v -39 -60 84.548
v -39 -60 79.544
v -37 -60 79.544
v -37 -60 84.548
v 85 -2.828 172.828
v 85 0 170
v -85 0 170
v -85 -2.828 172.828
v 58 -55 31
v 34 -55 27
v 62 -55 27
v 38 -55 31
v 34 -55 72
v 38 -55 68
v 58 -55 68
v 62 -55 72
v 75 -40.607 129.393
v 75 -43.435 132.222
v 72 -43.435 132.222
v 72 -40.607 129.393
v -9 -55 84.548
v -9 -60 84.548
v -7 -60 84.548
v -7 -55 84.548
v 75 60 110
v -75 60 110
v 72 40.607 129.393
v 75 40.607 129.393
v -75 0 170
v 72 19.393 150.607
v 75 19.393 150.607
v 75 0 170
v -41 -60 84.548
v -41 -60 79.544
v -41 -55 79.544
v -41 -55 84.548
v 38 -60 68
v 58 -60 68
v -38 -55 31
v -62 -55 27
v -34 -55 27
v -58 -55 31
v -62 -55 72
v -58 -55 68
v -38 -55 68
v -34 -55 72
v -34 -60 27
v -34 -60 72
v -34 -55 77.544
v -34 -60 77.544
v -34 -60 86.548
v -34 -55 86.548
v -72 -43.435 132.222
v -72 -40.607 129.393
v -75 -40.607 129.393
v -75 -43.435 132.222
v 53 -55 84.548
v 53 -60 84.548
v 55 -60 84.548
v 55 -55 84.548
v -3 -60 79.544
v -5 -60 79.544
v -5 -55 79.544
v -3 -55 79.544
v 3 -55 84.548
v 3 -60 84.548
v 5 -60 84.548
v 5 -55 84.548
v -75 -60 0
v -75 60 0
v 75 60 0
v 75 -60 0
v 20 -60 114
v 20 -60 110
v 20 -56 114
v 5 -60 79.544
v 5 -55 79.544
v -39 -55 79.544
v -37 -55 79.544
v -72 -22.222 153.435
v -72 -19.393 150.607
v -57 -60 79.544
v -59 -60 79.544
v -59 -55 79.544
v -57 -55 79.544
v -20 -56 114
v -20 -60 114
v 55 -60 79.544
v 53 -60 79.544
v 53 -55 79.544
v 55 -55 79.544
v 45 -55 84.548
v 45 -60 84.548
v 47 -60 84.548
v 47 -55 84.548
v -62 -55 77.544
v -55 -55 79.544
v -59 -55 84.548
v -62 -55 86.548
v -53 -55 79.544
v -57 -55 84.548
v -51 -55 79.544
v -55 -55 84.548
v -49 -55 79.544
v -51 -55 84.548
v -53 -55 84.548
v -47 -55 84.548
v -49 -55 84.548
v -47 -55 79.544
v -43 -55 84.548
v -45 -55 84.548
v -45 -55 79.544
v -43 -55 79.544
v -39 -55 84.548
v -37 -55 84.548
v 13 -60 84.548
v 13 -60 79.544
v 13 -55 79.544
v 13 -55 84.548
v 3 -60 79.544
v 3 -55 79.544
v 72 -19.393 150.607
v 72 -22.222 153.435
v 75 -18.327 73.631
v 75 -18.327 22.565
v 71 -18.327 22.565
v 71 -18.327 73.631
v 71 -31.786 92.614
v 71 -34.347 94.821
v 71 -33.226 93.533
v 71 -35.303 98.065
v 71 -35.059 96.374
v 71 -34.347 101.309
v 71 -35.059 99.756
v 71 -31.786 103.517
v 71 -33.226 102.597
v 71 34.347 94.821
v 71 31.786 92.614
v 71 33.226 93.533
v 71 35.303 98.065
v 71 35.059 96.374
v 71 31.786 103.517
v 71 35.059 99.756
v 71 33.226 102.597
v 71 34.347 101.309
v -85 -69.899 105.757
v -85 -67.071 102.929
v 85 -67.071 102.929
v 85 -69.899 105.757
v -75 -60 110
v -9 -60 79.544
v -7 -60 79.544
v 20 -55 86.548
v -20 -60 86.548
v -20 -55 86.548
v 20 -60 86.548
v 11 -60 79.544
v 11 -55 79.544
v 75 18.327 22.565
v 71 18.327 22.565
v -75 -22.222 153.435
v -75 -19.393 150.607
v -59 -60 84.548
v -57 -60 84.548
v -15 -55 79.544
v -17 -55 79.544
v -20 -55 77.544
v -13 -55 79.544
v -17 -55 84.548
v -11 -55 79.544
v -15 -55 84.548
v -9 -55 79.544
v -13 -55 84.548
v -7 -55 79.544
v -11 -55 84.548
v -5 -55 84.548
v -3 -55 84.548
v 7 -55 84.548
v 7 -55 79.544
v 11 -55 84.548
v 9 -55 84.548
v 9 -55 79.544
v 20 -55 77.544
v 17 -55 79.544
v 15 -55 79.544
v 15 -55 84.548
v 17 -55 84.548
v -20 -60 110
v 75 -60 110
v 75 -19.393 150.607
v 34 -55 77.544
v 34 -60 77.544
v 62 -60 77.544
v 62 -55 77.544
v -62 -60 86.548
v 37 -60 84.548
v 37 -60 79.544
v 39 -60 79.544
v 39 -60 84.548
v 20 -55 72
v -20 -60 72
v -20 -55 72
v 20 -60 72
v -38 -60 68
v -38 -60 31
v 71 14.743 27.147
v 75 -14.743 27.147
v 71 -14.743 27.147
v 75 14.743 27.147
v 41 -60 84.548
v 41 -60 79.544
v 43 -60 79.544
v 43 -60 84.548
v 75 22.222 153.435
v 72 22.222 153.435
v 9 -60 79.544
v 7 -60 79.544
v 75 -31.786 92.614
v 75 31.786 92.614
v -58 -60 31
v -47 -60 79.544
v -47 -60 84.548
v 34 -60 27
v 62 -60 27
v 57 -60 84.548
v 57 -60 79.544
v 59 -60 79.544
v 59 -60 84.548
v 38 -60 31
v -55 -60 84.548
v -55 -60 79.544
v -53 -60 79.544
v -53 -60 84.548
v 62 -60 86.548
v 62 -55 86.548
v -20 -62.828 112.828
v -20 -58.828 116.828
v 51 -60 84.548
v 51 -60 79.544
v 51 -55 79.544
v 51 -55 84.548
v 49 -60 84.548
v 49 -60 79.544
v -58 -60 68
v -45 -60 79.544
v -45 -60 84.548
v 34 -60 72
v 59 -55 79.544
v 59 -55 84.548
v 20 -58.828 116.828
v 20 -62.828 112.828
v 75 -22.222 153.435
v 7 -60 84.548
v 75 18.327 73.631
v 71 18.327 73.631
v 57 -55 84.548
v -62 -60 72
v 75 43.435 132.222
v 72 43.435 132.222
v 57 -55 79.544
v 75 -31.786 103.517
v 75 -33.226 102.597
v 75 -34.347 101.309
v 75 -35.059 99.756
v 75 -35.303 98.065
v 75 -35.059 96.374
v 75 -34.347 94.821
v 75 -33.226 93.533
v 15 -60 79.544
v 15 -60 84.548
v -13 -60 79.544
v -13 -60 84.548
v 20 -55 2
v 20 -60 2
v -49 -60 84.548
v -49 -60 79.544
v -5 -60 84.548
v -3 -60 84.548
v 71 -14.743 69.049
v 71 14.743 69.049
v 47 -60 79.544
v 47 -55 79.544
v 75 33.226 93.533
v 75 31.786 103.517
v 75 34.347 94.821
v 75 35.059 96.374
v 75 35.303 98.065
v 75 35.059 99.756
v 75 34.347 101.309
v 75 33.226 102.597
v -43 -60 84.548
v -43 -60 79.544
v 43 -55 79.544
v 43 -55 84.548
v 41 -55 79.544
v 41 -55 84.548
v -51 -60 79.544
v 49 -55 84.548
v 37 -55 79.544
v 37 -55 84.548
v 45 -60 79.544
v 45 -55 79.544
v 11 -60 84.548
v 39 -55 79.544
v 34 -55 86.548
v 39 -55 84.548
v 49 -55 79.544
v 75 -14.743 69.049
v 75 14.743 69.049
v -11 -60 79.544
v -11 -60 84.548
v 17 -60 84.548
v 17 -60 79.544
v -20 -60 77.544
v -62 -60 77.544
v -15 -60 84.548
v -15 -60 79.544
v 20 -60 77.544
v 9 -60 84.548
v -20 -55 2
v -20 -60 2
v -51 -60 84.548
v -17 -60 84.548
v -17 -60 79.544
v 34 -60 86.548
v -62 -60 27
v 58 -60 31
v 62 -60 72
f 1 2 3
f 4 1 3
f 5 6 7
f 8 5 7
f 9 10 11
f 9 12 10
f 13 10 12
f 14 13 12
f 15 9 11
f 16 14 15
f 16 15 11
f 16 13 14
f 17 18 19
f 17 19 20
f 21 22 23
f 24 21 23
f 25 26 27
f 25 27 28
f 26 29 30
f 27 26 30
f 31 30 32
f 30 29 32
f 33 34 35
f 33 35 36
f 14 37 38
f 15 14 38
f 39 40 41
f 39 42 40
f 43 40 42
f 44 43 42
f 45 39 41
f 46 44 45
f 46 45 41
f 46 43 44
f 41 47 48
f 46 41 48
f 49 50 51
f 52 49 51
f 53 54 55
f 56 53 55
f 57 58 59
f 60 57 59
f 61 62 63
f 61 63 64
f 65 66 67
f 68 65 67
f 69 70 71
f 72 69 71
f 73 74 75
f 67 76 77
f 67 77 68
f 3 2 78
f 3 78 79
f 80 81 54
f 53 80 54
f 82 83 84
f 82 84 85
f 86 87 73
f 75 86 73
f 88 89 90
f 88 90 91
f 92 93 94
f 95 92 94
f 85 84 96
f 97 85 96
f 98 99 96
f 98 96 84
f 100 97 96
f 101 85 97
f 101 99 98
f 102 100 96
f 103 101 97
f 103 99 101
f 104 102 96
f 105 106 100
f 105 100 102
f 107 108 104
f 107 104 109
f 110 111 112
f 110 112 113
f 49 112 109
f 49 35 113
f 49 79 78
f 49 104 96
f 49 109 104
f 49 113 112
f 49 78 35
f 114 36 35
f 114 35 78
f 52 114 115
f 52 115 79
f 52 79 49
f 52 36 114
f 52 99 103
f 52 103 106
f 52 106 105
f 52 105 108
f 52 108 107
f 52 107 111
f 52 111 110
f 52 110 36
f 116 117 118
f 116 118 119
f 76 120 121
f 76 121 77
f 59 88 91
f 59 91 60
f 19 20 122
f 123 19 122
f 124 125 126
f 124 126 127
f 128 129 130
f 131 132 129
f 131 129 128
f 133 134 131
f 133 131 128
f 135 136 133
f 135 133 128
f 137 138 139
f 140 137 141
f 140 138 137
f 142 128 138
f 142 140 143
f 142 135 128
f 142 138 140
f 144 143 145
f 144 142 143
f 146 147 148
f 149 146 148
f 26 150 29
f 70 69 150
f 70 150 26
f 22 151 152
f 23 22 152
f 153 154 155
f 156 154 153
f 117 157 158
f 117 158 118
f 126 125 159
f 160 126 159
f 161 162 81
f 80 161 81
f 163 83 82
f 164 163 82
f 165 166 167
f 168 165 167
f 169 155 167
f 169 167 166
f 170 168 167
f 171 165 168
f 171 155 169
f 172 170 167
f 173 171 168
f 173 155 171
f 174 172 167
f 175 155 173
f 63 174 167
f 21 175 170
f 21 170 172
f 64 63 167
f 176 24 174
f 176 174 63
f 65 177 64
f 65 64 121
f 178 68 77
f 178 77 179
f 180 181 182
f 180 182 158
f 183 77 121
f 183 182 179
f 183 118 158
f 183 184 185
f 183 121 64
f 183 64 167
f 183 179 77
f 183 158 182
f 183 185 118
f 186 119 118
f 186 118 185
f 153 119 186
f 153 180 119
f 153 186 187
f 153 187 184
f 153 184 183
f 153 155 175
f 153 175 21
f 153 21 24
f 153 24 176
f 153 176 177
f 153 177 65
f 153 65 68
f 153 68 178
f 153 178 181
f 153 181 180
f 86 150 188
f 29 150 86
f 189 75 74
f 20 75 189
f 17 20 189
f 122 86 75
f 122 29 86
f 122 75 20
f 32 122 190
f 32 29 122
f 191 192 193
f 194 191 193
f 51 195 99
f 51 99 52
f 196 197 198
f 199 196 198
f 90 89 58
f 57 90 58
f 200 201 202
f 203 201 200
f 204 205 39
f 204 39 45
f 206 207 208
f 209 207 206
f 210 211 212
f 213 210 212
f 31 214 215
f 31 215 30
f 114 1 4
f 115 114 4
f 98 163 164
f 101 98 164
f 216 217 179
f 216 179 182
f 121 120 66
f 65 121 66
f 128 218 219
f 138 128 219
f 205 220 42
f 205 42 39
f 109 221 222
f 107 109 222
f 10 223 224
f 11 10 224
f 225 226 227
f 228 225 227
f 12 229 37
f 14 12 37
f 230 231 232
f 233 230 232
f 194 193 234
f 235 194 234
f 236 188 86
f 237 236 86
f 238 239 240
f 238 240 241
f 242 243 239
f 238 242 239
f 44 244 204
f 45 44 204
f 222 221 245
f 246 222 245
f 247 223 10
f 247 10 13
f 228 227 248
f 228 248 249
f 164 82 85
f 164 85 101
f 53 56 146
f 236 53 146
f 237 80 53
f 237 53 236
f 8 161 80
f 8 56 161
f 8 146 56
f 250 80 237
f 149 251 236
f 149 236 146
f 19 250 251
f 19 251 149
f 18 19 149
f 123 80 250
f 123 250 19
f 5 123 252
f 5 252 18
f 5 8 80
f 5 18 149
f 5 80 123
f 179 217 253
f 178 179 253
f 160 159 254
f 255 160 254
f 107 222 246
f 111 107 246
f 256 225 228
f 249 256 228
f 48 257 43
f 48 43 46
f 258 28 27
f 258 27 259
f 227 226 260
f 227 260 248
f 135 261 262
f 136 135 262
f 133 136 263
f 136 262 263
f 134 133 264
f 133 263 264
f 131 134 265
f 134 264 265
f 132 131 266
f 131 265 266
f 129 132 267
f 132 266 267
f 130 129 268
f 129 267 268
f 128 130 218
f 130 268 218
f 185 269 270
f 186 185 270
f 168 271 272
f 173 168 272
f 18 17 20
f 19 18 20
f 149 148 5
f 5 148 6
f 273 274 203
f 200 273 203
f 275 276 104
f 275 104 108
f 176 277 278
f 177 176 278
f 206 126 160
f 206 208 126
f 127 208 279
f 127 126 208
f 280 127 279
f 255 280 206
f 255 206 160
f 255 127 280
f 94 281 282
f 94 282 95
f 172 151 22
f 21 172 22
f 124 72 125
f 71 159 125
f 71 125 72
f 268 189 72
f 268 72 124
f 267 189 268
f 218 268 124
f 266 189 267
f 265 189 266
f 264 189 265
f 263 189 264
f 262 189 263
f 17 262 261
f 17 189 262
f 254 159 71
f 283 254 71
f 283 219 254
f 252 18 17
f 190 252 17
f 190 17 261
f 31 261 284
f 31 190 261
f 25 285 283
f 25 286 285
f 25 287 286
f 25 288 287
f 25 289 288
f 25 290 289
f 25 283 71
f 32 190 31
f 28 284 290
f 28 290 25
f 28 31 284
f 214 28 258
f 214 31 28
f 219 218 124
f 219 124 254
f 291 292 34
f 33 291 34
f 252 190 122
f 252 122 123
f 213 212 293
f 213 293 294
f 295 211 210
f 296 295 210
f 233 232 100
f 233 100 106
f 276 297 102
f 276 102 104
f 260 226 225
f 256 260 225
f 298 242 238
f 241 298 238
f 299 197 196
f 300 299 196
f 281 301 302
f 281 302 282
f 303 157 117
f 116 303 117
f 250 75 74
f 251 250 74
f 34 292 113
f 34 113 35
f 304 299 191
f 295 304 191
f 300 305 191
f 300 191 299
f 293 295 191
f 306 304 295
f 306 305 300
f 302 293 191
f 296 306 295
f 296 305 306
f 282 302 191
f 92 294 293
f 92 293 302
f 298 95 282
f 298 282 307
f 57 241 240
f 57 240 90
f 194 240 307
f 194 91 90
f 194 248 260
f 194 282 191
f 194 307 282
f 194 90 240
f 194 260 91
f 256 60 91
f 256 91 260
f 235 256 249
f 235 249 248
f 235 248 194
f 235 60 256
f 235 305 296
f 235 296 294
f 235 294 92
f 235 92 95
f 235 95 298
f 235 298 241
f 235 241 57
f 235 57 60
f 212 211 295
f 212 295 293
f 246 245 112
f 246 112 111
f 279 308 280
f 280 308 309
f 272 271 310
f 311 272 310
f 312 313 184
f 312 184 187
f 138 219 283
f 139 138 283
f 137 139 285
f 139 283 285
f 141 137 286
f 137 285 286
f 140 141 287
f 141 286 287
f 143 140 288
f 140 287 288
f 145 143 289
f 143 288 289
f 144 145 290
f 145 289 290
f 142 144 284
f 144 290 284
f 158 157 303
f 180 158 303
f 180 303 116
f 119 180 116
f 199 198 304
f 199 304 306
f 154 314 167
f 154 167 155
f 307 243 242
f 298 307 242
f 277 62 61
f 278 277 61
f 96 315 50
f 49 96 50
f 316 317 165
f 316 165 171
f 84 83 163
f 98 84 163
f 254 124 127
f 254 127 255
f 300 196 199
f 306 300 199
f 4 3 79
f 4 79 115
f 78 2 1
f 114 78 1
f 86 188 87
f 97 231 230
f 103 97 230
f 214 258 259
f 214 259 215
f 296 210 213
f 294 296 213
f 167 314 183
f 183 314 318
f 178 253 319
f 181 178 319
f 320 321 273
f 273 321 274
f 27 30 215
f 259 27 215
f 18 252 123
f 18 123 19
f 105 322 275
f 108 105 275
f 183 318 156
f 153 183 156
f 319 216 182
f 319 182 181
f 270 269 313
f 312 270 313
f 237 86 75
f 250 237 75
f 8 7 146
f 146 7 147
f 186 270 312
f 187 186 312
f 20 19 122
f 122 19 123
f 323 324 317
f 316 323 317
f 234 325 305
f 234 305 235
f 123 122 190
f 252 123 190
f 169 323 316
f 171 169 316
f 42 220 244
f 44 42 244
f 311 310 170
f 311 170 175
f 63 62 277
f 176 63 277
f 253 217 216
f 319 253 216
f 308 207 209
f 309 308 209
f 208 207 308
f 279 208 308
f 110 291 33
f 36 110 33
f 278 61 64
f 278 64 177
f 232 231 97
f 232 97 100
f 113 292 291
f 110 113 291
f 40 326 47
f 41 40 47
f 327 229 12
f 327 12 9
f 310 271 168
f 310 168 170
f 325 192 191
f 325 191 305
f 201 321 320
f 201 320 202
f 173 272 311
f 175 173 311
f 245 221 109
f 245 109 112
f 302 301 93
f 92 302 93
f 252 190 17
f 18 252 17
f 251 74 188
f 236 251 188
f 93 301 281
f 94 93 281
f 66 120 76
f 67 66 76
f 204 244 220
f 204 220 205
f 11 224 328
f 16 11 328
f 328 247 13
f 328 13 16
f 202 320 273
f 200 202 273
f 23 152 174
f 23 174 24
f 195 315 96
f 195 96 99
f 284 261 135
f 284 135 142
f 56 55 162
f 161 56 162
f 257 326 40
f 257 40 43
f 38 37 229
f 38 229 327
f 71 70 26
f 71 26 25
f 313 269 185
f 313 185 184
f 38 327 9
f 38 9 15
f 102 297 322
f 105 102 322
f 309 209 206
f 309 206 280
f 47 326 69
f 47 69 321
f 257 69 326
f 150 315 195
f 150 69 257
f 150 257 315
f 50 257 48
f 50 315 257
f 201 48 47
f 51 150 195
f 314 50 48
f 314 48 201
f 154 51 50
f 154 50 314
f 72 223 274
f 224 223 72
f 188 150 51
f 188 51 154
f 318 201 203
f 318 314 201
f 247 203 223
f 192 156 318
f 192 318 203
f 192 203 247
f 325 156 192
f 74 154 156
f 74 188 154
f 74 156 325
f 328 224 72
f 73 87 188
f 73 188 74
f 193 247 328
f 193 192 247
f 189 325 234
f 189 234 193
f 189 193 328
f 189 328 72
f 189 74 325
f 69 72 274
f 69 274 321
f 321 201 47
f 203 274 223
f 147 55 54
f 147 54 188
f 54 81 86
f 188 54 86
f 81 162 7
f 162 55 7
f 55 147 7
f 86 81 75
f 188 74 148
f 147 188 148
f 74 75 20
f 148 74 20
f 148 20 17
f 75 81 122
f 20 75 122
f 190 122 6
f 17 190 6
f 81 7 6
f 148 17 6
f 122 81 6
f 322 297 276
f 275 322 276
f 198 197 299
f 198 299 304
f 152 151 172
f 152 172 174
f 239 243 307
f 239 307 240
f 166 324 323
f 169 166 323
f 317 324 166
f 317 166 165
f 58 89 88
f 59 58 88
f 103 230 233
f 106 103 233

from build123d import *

# Parameters (mm, degrees)
F0_W      = 150
F0_H      = 120
F1_DEPTH  = 170
F2_SIZE   = 59.99999
F3_W      = 28
F3_H      = 9.0039297938
F3_W_2    = 2
F3_H_2    = 5.0039297938
F3_H_3    = 45
F3_W_3    = 20
F3_H_4    = 37
F3_W_4    = 40
F3_H_5    = 70
F4_DEPTH  = 5
F3_H_6    = 3.99999
F5_DEPTH  = 4
F6_W      = 36.6545170546
F6_H      = 51.0658398271
F6_W_2    = 29.4850878417
F6_H_2    = 41.9020280242
F6_W_3    = 63.571639359
F6_H_3    = 10.9027773142
F7_DEPTH  = 4
F8_DEPTH  = 3
F10_DEPTH = 4


# Not quite as in the source:
# - a fillet or chamfer is up to 0.001 mm smaller than in the source, because OpenCascade refuses the exact size
# - ends of sketch curves that miss each other by under 0.0002 mm in the source are joined
# - a feature names something its author has since deleted; it is built from what else it names


with BuildPart() as f1:
    # F0 (on Top) → F1 (new body)
    with BuildSketch(Plane.XY):
        Rectangle(F0_W, F0_H)
    extrude(amount=F1_DEPTH)

    # F2 (size 60 in the source; OpenCascade refuses exactly that, so slightly less here)
    f2_edges = [f1.edges().sort_by_distance(p)[0] for p in [
        (0, -60, 170),
        (0, 60, 170),
    ]]
    chamfer(f2_edges, length=F2_SIZE)

    # F3 (on face) → F4 (cut)
    with BuildSketch(Plane.XZ.offset(60)):
        with Locations((-48, 82.0457972586)):
            Rectangle(F3_W, F3_H)
        with Locations((-58, 82.0457972586)):
            Rectangle(F3_W_2, F3_H_2, mode=Mode.SUBTRACT)
        with Locations((-54, 82.0457972586)):
            Rectangle(F3_W_2, F3_H_2, mode=Mode.SUBTRACT)
        with Locations((-50, 82.0457972586)):
            Rectangle(F3_W_2, F3_H_2, mode=Mode.SUBTRACT)
        with Locations((-46, 82.0457972586)):
            Rectangle(F3_W_2, F3_H_2, mode=Mode.SUBTRACT)
        with Locations((-42, 82.0457972586)):
            Rectangle(F3_W_2, F3_H_2, mode=Mode.SUBTRACT)
        with Locations((-38, 82.0457972586)):
            Rectangle(F3_W_2, F3_H_2, mode=Mode.SUBTRACT)
        with Locations((-48, 49.5)):
            Rectangle(F3_W, F3_H_3)
        with Locations((-48, 49.5)):
            Rectangle(F3_W_3, F3_H_4, mode=Mode.SUBTRACT)
        with Locations((0, 37)):
            Rectangle(F3_W_4, F3_H_5)
        with Locations((0, 82.0457972586)):
            Rectangle(F3_W_4, F3_H)
        with Locations((-16, 82.0457972586)):
            Rectangle(F3_W_2, F3_H_2, mode=Mode.SUBTRACT)
        with Locations((-12, 82.0457972586)):
            Rectangle(F3_W_2, F3_H_2, mode=Mode.SUBTRACT)
        with Locations((-8, 82.0457972586)):
            Rectangle(F3_W_2, F3_H_2, mode=Mode.SUBTRACT)
        with Locations((-4, 82.0457972586)):
            Rectangle(F3_W_2, F3_H_2, mode=Mode.SUBTRACT)
        with Locations((4, 82.0457972586)):
            Rectangle(F3_W_2, F3_H_2, mode=Mode.SUBTRACT)
        with Locations((8, 82.0457972586)):
            Rectangle(F3_W_2, F3_H_2, mode=Mode.SUBTRACT)
        with Locations((12, 82.0457972586)):
            Rectangle(F3_W_2, F3_H_2, mode=Mode.SUBTRACT)
        with Locations((16, 82.0457972586)):
            Rectangle(F3_W_2, F3_H_2, mode=Mode.SUBTRACT)
        with Locations((48, 82.0457972586)):
            Rectangle(F3_W, F3_H)
        with Locations((38, 82.0457972586)):
            Rectangle(F3_W_2, F3_H_2, mode=Mode.SUBTRACT)
        with Locations((42, 82.0457972586)):
            Rectangle(F3_W_2, F3_H_2, mode=Mode.SUBTRACT)
        with Locations((46, 82.0457972586)):
            Rectangle(F3_W_2, F3_H_2, mode=Mode.SUBTRACT)
        with Locations((50, 82.0457972586)):
            Rectangle(F3_W_2, F3_H_2, mode=Mode.SUBTRACT)
        with Locations((54, 82.0457972586)):
            Rectangle(F3_W_2, F3_H_2, mode=Mode.SUBTRACT)
        with Locations((58, 82.0457972586)):
            Rectangle(F3_W_2, F3_H_2, mode=Mode.SUBTRACT)
        with Locations((48, 49.5)):
            Rectangle(F3_W, F3_H_3)
        with Locations((48, 49.5)):
            Rectangle(F3_W_3, F3_H_4, mode=Mode.SUBTRACT)
    extrude(amount=-F4_DEPTH, mode=Mode.SUBTRACT)

    # F3 (on face) → F5 (join)
    with BuildSketch(Plane.XZ.offset(60)):
        with Locations((0, 112.000005)):
            Rectangle(F3_W_4, F3_H_6)
    extrude(amount=-F5_DEPTH)

    # F6 (on face) → F7 (cut)
    with BuildSketch(Plane.YZ.offset(75)):
        with Locations((0, 48.0980910361)):
            Rectangle(F6_W, F6_H)
        with Locations((0, 48.0980910361)):
            Rectangle(F6_W_2, F6_H_2, mode=Mode.SUBTRACT)
        with Locations((0, 98.0651453137)):
            Rectangle(F6_W_3, F6_H_3)
        with BuildLine():
            Line((-31.7858196795, 92.6137566566), (-31.7858196795, 103.5165339708))
            ThreePointArc((-31.7858196795, 103.5165339708), (-35.3030027089, 98.0651453137), (-31.7858196795, 92.6137566566))
        make_face()
        with BuildLine():
            ThreePointArc((31.7858196795, 92.6137566566), (35.3030027089, 98.0651453137), (31.7858196795, 103.5165339708))
            Line((31.7858196795, 103.5165339708), (31.7858196795, 92.6137566566))
        make_face()
    extrude(amount=-F7_DEPTH, mode=Mode.SUBTRACT)

    # F6 (on face) → F8 (join)
    with BuildSketch(Plane.YZ.offset(75)):
        Polygon((-43.4350288425, 132.2218254069), (-40.6066017178, 129.3933982822), (-19.3934032822, 150.6066067178), (-22.2218254069, 153.4350288425), align=None)
        Polygon((22.2218254069, 153.4350288425), (19.3933982822, 150.6066017178), (40.6066067178, 129.3934032822), (43.4350288425, 132.2218254069), align=None)
    extrude(amount=-F8_DEPTH)


with BuildPart() as f10:
    # F9 (on face) → F10 (new body)
    with BuildSketch(Plane(origin=(0, -85, 85), x_dir=(1, 0, 0), z_dir=(0, -0.7071067812, 0.7071067812))):
        Polygon((75, 35.3553390593), (75, 62.7817459305), (72, 62.7817459305), (72, 92.7817459305), (75, 92.7817459305), (75, 120.2081528017), (-75, 120.2081528017), (-75, 92.7817459305), (-72, 92.7817459305), (-72, 62.7817459305), (-75, 62.7817459305), (-75, 35.3553390593), (-20, 35.3553390593), (-20, 41.0121933088), (20, 41.0121933088), (20, 35.3553390593), align=None)
        Polygon((75, 92.7817459305), (75, 62.7817459305), (75, 35.3553390593), (20, 35.3553390593), (-20, 35.3553390593), (-75, 35.3553390593), (-75, 62.7817459305), (-75, 92.7817459305), (-75, 120.2081528017), (-85, 120.2081528017), (-85, 25.3553390593), (0, 25.3553390593), (85, 25.3553390593), (85, 120.2081528017), (75, 120.2081528017), align=None)
    extrude(amount=F10_DEPTH)


solid = Compound([f1.part, f10.part])
